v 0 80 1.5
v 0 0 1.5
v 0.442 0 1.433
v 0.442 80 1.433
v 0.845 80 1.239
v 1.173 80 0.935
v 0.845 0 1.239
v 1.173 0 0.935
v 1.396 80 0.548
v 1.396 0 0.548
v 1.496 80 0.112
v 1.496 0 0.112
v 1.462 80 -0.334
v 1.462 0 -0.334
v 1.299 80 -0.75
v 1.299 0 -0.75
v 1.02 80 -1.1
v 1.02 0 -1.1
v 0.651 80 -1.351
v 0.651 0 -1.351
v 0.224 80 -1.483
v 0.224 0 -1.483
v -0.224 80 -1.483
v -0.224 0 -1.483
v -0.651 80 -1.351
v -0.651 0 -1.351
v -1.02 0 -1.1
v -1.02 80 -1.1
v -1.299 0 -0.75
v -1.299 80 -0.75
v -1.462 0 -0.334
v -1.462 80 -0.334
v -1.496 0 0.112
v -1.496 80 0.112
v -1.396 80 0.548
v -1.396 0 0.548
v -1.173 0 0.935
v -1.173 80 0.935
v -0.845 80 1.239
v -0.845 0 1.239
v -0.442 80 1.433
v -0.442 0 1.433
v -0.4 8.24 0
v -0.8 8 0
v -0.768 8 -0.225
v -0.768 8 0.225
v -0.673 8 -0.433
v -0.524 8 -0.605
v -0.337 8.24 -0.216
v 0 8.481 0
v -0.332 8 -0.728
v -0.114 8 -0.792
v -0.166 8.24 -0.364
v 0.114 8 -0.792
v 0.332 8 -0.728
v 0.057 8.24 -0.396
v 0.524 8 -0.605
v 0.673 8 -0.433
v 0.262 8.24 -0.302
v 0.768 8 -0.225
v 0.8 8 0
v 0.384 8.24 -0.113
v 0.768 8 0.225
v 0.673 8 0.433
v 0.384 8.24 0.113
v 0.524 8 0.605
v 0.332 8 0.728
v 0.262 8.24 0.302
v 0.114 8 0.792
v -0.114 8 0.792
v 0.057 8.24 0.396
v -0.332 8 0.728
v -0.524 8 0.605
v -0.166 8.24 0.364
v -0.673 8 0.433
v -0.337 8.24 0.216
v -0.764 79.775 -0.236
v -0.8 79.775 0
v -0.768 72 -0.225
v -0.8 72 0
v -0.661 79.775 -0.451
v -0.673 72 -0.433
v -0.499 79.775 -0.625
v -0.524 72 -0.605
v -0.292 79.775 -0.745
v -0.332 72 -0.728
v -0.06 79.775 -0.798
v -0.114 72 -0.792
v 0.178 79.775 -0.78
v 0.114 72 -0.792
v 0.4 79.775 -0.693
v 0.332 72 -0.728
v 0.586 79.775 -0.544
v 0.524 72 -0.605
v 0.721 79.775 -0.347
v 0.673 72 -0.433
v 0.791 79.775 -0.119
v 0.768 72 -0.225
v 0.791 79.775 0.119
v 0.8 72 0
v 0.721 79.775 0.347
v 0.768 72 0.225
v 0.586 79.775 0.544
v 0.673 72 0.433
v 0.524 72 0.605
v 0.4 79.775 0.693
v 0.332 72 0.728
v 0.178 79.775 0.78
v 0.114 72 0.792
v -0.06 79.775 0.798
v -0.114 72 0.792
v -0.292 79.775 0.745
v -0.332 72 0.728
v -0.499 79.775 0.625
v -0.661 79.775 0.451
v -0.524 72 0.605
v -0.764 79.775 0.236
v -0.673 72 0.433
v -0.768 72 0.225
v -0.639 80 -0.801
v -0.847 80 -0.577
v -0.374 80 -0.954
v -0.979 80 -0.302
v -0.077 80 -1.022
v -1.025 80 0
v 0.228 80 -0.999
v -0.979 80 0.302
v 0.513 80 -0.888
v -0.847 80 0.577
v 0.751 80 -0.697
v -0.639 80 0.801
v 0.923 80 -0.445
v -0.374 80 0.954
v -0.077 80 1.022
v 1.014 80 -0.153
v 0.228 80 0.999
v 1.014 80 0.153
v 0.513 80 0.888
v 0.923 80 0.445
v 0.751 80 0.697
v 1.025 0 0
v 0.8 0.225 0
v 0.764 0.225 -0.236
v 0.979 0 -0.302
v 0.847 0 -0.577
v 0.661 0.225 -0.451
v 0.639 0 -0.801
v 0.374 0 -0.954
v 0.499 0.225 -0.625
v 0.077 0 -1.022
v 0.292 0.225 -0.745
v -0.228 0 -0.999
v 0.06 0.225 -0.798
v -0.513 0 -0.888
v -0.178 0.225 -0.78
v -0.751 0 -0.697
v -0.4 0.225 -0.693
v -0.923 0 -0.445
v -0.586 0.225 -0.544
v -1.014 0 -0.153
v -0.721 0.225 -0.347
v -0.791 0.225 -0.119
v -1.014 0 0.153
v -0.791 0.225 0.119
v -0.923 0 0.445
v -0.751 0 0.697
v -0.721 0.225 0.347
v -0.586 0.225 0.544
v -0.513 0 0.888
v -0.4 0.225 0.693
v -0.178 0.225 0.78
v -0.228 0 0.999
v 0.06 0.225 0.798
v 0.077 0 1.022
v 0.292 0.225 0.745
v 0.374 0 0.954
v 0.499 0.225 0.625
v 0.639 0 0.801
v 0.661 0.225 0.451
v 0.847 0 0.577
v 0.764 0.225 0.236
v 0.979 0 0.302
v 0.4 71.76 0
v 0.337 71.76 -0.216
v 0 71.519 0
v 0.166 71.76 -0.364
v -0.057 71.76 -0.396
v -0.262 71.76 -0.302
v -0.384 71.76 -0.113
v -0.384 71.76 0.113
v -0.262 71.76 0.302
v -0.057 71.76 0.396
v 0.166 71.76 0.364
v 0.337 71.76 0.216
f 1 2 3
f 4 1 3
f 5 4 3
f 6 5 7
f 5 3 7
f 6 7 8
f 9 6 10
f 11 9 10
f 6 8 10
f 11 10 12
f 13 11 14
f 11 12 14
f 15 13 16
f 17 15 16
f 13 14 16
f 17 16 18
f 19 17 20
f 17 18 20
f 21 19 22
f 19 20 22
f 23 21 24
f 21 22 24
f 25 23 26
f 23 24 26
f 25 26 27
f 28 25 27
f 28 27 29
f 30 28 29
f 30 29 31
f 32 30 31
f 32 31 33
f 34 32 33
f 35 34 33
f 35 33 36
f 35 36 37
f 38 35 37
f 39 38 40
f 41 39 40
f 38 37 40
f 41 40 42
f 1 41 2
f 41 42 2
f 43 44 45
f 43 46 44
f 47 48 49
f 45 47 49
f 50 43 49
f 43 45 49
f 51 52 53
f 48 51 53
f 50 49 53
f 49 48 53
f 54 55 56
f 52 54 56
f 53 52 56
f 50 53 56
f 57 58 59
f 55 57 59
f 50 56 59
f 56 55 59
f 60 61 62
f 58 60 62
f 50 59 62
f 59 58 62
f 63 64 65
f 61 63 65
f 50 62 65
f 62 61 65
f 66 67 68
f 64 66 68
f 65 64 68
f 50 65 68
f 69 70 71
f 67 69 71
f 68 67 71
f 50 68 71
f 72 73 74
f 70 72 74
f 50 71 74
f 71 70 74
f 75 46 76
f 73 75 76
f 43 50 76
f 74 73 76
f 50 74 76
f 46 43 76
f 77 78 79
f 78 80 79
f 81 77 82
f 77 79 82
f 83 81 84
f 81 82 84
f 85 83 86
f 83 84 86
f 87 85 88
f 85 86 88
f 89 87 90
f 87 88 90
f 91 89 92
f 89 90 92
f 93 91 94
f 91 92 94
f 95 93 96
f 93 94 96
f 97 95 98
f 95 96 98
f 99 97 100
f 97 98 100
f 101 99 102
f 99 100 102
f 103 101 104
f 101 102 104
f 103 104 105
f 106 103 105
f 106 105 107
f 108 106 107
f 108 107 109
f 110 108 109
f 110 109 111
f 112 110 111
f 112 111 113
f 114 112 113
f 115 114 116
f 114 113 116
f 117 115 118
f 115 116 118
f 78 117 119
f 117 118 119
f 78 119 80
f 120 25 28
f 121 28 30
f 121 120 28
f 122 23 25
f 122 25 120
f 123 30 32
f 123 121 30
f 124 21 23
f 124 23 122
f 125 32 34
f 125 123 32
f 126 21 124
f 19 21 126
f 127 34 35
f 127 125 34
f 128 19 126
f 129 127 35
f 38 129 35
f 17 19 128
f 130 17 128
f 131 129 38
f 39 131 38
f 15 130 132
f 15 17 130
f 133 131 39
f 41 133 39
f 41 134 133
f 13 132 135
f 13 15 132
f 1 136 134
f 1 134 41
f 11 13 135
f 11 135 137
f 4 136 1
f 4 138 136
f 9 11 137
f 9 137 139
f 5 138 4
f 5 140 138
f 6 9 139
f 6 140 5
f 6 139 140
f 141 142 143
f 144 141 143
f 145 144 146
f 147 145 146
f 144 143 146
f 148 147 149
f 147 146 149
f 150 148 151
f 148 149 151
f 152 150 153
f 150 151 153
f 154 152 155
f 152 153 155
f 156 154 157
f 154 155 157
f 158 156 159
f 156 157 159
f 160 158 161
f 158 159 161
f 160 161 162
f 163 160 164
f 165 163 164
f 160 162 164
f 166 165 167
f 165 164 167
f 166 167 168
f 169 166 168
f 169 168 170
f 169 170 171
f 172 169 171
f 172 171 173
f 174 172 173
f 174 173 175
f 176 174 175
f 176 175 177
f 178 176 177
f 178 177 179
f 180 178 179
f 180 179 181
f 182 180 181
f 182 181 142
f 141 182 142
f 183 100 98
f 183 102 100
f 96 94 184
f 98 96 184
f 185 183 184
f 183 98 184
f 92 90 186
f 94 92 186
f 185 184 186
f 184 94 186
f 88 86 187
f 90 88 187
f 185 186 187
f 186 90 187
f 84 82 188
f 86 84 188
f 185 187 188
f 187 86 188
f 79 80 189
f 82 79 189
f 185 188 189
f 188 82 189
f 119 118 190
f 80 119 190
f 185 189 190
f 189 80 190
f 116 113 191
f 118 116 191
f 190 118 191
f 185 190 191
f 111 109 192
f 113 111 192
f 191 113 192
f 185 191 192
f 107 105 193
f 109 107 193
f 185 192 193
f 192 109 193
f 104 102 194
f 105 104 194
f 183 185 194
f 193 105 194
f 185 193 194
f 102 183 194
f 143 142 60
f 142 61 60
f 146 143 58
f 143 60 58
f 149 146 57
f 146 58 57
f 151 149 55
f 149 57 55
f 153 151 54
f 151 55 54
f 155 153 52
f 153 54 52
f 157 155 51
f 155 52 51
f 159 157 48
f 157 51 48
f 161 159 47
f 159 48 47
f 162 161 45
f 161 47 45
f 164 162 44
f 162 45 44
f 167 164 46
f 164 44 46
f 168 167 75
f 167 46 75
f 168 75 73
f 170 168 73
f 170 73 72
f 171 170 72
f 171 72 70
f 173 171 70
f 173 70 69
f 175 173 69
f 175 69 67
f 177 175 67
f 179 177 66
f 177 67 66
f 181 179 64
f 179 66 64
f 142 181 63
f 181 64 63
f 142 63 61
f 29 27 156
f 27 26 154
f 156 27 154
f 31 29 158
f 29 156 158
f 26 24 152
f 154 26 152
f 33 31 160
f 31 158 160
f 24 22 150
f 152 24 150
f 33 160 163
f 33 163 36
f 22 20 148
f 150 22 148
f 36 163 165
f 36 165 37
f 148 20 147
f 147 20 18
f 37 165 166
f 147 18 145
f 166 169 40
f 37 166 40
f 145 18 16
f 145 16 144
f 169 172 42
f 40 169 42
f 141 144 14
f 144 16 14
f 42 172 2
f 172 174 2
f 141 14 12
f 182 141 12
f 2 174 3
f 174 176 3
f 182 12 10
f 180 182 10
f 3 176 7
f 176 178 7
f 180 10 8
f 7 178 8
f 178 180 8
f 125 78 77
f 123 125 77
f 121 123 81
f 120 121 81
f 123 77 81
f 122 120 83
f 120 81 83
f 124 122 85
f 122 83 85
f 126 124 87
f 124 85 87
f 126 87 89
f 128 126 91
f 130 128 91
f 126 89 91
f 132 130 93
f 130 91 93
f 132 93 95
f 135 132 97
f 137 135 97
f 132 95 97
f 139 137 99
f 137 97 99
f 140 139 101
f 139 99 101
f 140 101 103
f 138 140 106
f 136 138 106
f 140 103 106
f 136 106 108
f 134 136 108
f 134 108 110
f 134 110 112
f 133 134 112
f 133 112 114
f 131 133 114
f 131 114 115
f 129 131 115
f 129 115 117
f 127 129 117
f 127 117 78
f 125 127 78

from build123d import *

# Parameters (mm, degrees)
SKETCH1_R                   = 1.5
BOSS_EXTRUDE1_DEPTH         = 80
M2_TAPPED_HOLE1_D           = 1.6
M2_TAPPED_HOLE1_DEPTH       = 8
M2_TAPPED_HOLE1_CSINK_D     = 2.05
M2_TAPPED_HOLE1_CSINK_ANGLE = 90
M2_TAPPED_HOLE1_TIP         = 0.480688495
M2_TAPPED_HOLE2_D           = 1.6
M2_TAPPED_HOLE2_DEPTH       = 8
M2_TAPPED_HOLE2_CSINK_D     = 2.05
M2_TAPPED_HOLE2_CSINK_ANGLE = 90
M2_TAPPED_HOLE2_TIP         = 0.480688495


with BuildPart() as part:
    # Sketch1 → Boss-Extrude1 (new body)
    with BuildSketch(Plane(origin=(0, 0, 0), x_dir=(1, 0, 0), z_dir=(0, 1, 0))):
        with Locations(Location((0, 0, 0), (0, 0, 270))):
            Circle(SKETCH1_R)
    extrude(amount=BOSS_EXTRUDE1_DEPTH)

    # M2 Tapped Hole1
    with Locations(Plane(origin=(0, 80, 0), x_dir=(1, 0, 0), z_dir=(0, 1, 0))):
        with Locations((0, 0)):
            CounterSinkHole(M2_TAPPED_HOLE1_D / 2, M2_TAPPED_HOLE1_CSINK_D / 2, depth=M2_TAPPED_HOLE1_DEPTH, counter_sink_angle=M2_TAPPED_HOLE1_CSINK_ANGLE)
            with Locations((0, 0, -(M2_TAPPED_HOLE1_DEPTH + M2_TAPPED_HOLE1_TIP / 2))):  # 118° drill point
                Cone(0, M2_TAPPED_HOLE1_D / 2, M2_TAPPED_HOLE1_TIP, mode=Mode.SUBTRACT)

    # M2 Tapped Hole2
    with Locations(Plane(origin=(0, 0, 0), x_dir=(-1, 0, 0), z_dir=(0, -1, 0))):
        with Locations((0, 0)):
            CounterSinkHole(M2_TAPPED_HOLE2_D / 2, M2_TAPPED_HOLE2_CSINK_D / 2, depth=M2_TAPPED_HOLE2_DEPTH, counter_sink_angle=M2_TAPPED_HOLE2_CSINK_ANGLE)
            with Locations((0, 0, -(M2_TAPPED_HOLE2_DEPTH + M2_TAPPED_HOLE2_TIP / 2))):  # 118° drill point
                Cone(0, M2_TAPPED_HOLE2_D / 2, M2_TAPPED_HOLE2_TIP, mode=Mode.SUBTRACT)


solid = part.part
